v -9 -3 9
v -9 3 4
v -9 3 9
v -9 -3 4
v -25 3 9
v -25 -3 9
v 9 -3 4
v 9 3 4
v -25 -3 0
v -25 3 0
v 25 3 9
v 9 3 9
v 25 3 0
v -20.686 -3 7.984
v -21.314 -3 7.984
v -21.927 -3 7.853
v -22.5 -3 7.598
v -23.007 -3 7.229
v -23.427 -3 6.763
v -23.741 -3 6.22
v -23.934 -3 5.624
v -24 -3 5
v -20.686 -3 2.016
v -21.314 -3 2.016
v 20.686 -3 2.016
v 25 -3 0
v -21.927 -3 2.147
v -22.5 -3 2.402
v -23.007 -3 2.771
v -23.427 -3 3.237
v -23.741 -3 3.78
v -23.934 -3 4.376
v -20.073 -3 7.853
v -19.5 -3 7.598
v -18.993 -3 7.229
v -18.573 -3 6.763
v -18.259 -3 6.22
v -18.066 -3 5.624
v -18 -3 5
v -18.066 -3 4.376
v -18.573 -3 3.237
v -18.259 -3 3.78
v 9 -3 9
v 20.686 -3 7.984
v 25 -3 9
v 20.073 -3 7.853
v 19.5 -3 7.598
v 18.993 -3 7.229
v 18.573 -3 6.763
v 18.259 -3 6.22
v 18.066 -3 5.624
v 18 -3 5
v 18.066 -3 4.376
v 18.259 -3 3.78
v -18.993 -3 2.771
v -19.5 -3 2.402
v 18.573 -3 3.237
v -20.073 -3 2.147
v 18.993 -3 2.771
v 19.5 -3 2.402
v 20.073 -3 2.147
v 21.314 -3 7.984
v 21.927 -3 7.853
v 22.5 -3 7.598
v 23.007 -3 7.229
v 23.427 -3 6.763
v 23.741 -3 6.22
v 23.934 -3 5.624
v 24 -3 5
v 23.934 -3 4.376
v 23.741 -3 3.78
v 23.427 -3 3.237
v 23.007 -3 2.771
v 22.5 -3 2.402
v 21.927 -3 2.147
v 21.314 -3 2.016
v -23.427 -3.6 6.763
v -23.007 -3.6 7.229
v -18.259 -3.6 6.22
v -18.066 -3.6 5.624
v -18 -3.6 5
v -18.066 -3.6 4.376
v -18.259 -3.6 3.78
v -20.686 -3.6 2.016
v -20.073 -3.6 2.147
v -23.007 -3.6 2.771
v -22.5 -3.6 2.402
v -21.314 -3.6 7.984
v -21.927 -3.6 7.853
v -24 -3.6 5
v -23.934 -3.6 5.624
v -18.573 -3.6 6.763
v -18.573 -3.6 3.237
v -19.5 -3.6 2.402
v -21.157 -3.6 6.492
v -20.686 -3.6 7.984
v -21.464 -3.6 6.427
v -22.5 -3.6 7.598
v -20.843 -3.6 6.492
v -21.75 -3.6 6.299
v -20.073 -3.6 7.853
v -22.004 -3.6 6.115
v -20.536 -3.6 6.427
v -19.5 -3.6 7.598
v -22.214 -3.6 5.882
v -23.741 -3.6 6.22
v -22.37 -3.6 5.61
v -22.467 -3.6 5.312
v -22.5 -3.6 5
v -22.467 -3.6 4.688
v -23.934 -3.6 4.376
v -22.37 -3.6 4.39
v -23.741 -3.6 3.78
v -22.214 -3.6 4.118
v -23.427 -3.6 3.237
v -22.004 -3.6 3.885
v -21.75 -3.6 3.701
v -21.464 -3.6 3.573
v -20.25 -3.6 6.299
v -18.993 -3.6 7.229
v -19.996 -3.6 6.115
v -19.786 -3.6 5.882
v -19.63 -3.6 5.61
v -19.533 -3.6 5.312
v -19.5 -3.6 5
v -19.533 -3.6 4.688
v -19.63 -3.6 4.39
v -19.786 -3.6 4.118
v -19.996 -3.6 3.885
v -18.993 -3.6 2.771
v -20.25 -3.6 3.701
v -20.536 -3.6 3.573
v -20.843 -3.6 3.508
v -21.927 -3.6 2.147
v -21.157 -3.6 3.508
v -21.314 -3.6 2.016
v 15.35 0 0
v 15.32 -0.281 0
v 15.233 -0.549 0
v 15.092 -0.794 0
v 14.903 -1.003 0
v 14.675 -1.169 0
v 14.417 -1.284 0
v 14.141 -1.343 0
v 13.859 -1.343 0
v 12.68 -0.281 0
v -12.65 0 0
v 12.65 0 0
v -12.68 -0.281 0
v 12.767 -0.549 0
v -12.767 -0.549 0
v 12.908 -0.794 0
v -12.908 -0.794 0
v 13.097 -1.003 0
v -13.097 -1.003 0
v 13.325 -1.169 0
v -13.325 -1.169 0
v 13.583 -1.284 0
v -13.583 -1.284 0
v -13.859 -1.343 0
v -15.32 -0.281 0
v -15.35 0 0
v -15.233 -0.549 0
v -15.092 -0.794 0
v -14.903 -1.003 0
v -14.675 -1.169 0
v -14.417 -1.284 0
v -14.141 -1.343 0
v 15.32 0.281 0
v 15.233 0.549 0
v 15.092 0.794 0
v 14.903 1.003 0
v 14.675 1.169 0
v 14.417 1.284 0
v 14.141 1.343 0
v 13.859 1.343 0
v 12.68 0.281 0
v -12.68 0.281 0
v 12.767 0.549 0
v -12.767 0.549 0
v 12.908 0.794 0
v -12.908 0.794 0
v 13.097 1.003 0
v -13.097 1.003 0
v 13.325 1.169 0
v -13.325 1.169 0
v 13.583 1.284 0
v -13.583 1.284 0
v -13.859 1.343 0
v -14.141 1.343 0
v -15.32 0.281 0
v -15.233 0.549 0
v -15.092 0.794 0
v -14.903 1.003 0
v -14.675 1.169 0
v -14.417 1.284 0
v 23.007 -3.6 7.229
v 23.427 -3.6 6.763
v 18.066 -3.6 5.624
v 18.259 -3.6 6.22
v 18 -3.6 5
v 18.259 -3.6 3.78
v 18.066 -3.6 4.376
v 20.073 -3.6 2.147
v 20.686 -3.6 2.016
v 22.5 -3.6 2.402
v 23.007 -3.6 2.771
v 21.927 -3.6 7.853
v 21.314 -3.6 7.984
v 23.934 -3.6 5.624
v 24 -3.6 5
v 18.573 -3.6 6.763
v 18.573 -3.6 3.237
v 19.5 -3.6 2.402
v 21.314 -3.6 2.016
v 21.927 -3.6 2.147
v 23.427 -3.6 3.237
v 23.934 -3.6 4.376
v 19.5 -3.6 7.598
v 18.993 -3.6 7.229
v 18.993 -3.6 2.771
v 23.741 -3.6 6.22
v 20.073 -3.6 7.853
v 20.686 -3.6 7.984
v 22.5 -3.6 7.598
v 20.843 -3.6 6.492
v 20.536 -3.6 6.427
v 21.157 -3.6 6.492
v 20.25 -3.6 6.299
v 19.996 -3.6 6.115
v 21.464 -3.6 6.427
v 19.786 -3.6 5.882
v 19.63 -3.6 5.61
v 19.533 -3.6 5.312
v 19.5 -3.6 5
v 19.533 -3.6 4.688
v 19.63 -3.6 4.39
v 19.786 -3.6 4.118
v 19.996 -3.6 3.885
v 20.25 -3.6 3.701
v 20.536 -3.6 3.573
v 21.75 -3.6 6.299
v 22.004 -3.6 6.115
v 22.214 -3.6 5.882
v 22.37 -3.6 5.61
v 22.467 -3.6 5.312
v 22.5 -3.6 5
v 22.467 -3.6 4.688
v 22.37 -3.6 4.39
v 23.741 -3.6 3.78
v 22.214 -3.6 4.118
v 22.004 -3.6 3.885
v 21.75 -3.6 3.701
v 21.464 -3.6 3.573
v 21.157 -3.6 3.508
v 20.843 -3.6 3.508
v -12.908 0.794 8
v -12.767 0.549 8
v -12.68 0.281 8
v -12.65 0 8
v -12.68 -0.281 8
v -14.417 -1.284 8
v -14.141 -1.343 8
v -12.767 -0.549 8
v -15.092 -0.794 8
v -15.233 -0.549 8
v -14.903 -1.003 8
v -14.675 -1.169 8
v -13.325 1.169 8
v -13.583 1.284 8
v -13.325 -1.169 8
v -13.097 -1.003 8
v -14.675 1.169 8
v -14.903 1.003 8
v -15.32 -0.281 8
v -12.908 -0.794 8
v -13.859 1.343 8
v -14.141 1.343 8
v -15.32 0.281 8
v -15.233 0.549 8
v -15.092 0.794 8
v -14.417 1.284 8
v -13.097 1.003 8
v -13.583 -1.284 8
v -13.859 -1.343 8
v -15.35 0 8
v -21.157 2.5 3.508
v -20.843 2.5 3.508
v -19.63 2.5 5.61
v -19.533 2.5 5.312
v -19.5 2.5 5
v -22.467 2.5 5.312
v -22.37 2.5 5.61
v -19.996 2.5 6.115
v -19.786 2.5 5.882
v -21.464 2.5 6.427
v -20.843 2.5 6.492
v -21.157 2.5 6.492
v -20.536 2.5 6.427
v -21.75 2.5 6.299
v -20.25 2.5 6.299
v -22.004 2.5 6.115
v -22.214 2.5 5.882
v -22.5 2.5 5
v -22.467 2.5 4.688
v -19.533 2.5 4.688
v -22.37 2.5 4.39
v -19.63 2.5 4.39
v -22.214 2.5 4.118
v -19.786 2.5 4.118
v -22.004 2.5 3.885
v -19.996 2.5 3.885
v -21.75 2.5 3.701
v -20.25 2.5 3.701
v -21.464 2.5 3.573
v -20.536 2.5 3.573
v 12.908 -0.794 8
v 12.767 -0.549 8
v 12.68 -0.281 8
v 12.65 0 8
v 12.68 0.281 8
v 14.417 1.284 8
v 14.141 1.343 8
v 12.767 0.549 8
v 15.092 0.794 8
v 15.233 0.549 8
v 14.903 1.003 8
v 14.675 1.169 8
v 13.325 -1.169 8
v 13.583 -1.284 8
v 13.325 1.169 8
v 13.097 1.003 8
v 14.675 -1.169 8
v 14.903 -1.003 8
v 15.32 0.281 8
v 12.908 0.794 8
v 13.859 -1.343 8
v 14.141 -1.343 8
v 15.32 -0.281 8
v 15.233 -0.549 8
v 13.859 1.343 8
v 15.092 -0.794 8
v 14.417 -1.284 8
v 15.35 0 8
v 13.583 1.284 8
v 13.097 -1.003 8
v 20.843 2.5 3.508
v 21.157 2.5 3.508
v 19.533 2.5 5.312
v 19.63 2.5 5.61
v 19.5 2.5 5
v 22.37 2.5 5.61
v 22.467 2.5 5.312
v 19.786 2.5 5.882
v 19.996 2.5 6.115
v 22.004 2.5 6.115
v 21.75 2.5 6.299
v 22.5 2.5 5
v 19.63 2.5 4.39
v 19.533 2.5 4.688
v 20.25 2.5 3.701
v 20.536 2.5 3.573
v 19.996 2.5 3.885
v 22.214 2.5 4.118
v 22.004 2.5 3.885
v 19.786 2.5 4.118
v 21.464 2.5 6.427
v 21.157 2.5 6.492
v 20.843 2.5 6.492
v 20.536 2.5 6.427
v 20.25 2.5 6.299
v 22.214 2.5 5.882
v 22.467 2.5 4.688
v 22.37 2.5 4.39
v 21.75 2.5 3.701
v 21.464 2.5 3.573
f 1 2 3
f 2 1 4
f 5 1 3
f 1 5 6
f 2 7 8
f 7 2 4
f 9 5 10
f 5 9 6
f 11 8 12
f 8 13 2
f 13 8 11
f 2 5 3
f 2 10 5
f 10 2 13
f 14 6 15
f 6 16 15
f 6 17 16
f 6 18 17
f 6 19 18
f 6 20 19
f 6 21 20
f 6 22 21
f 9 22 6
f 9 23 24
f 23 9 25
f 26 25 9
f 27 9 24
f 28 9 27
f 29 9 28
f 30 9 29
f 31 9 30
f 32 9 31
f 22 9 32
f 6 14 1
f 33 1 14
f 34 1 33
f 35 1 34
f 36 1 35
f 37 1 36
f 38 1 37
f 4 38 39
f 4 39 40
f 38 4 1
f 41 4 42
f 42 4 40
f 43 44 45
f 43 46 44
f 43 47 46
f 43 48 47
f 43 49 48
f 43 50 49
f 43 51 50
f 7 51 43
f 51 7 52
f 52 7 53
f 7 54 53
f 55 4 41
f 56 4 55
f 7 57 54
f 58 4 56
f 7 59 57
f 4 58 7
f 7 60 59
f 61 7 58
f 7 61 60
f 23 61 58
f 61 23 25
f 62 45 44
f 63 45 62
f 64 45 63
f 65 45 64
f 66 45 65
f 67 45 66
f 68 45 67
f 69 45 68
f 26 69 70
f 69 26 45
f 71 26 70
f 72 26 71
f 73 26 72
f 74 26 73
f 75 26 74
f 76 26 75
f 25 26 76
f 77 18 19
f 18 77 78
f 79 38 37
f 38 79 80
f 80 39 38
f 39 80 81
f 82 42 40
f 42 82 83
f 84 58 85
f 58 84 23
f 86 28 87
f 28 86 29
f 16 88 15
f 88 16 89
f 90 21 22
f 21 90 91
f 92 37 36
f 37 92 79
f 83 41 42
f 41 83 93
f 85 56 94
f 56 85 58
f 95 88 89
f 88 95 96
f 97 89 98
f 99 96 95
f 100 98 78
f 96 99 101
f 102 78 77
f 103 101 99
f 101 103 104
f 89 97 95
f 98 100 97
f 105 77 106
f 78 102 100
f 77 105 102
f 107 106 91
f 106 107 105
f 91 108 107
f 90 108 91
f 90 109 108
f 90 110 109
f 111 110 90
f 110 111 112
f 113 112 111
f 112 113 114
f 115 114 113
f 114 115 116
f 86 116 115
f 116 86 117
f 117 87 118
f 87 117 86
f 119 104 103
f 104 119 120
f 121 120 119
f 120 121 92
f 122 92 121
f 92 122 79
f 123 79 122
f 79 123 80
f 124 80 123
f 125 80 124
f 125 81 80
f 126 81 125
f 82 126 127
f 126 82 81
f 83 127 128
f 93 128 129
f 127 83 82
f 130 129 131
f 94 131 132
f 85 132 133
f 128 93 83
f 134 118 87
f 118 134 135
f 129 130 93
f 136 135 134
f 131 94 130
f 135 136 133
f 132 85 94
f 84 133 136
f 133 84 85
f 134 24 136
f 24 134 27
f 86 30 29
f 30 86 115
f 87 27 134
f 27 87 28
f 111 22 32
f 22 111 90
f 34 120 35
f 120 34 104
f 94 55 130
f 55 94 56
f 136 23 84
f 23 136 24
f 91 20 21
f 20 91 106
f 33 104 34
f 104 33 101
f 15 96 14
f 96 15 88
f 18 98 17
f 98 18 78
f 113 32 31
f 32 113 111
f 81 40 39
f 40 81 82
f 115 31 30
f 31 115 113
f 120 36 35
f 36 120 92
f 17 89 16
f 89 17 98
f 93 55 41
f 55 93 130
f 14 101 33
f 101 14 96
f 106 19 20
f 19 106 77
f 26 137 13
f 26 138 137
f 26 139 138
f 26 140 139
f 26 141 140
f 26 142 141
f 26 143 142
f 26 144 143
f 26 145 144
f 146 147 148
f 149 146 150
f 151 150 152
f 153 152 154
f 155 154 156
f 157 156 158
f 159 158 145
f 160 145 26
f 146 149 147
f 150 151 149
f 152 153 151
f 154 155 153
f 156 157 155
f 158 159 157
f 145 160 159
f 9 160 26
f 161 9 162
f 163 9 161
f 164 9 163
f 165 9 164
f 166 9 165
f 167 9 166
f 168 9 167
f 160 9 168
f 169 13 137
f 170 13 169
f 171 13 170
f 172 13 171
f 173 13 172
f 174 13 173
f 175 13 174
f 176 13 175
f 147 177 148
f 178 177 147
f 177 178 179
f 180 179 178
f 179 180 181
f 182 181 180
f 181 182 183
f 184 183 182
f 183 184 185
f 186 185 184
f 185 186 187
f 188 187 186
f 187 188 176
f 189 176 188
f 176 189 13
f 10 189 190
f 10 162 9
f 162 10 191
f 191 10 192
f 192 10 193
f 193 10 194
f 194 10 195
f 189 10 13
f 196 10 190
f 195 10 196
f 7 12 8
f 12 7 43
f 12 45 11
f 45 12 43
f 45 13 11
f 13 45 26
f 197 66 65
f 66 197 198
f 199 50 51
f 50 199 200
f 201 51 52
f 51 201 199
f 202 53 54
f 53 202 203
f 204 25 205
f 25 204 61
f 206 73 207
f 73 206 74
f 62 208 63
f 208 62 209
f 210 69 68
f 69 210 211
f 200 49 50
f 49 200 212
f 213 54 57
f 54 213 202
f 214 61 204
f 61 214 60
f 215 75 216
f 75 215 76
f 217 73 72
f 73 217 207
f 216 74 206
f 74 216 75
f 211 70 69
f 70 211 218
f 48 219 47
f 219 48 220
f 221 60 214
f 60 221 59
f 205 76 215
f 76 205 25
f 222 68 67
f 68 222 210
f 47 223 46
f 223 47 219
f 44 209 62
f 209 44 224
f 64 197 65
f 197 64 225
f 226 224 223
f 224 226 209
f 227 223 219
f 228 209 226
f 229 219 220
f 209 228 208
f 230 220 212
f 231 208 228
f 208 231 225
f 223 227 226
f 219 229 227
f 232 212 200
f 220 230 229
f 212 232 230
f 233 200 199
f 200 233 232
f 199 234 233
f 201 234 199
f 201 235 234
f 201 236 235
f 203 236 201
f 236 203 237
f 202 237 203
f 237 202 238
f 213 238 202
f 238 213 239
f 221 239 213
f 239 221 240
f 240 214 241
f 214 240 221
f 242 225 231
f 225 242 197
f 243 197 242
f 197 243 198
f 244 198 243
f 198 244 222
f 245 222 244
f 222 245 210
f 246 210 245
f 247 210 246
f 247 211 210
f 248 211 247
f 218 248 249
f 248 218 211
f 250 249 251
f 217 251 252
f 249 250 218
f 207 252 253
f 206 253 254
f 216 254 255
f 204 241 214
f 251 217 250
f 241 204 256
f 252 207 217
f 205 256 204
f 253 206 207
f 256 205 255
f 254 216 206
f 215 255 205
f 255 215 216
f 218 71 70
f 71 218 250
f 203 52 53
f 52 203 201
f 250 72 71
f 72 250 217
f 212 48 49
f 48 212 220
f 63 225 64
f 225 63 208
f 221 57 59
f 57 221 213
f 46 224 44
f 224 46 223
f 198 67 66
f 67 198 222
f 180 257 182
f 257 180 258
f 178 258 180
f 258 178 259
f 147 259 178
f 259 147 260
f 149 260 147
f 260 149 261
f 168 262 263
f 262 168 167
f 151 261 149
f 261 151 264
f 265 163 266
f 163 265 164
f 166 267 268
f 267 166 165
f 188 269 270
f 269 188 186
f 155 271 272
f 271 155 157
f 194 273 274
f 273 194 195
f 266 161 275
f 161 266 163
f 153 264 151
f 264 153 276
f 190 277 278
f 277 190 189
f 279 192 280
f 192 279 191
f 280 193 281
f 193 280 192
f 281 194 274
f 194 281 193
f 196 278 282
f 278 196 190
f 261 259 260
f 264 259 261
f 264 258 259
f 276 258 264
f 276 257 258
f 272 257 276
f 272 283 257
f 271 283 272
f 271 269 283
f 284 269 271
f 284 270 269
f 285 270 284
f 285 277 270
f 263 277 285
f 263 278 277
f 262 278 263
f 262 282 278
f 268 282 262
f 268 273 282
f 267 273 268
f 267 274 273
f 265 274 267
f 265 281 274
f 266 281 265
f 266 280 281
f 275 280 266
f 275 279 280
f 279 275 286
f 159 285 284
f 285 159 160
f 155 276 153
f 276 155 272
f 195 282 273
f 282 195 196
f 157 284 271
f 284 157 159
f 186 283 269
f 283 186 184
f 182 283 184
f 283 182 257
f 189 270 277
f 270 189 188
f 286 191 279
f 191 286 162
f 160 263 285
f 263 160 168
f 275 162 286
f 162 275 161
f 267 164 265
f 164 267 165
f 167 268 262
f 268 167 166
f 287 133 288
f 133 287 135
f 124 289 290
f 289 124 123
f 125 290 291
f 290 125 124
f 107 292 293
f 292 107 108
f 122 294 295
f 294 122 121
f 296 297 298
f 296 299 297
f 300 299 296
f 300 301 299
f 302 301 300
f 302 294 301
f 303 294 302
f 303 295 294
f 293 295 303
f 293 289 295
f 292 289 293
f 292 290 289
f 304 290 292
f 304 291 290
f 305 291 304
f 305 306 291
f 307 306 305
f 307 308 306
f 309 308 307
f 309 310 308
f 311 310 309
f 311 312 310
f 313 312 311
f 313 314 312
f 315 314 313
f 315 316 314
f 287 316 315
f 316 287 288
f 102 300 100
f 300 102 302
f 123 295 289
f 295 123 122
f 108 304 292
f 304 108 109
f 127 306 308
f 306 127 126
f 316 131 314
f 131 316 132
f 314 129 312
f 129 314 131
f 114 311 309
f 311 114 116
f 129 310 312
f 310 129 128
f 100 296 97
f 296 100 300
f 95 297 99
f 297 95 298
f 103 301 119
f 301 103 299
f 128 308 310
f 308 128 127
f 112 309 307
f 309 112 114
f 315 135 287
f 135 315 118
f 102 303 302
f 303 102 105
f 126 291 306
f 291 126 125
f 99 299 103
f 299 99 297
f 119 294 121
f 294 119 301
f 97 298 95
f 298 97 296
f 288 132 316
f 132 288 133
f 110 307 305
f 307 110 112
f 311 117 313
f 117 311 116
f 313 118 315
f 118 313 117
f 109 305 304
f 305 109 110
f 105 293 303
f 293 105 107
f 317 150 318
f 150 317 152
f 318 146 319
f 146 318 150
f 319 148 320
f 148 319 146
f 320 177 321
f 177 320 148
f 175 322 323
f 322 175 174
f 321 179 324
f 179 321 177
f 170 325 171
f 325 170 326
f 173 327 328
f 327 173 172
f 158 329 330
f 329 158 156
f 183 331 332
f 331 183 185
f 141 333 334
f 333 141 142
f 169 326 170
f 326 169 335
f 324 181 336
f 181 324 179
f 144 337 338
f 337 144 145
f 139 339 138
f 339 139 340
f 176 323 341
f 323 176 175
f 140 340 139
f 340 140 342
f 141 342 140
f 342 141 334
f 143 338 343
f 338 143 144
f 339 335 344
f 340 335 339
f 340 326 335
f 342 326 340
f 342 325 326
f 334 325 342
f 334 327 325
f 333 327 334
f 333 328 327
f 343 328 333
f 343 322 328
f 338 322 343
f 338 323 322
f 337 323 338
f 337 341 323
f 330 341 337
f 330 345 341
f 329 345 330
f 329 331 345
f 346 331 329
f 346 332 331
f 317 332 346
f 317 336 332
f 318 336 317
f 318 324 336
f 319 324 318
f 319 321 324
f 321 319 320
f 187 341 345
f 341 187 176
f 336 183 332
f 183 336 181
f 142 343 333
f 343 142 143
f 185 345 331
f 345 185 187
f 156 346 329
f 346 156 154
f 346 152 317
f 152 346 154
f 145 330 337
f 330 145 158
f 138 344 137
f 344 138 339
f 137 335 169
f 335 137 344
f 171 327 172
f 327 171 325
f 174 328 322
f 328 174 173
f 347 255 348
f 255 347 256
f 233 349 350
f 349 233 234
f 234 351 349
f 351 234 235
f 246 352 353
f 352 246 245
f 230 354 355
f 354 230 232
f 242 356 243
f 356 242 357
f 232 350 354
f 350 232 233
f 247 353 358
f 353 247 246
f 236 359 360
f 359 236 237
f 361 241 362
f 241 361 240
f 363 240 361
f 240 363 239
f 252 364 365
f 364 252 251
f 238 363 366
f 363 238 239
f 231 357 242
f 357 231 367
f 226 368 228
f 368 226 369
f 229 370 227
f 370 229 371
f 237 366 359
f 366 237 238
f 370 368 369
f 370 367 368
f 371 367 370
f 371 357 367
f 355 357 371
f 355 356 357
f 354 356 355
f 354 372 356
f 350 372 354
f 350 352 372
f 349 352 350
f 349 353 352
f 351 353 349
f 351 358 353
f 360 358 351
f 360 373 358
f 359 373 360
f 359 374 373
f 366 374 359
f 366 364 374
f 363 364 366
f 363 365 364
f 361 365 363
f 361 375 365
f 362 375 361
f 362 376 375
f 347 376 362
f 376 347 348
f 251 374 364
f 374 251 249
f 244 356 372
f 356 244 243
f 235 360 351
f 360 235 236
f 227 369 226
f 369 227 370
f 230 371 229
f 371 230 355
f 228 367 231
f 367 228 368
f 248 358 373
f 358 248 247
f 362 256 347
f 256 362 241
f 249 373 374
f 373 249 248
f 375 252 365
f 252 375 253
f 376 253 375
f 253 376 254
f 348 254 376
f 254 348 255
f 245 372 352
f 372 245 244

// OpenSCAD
Pin_Distance=42;
shim=0;

dis=Pin_Distance;
len=dis+8;

translate([0,0,shim])
difference()
{
    union()
    {
        translate([-len/2,-3,-shim]) cube([len,6,4+shim]);
        for(rot=[0:180:180]) rotate([0,0,rot])
        {
            translate([-len/2,-3,4]) cube([16,6,5]);
            translate([-dis/2,-3+3*rot/90,5]) rotate([90,0,0])
                color([0,0,1]) cylinder(center=true,h=1.2,d=6,$fn=30);
            translate([-14,0,-shim])
                cylinder(h=9+shim,d=6,$fn=30);
        }
    }
    for(rot=[0:180:180]) rotate([0,0,rot])
    {
         translate([-14,0,-0.1-shim]) cylinder(h=8.1+shim,d=2.7,$fn=30);
         translate([-dis/2,-3+3*rot/90,5]) rotate([90,0,0])
                color([0,0,1]) cylinder(center=true,h=11,d=3,$fn=30);
    }
}
